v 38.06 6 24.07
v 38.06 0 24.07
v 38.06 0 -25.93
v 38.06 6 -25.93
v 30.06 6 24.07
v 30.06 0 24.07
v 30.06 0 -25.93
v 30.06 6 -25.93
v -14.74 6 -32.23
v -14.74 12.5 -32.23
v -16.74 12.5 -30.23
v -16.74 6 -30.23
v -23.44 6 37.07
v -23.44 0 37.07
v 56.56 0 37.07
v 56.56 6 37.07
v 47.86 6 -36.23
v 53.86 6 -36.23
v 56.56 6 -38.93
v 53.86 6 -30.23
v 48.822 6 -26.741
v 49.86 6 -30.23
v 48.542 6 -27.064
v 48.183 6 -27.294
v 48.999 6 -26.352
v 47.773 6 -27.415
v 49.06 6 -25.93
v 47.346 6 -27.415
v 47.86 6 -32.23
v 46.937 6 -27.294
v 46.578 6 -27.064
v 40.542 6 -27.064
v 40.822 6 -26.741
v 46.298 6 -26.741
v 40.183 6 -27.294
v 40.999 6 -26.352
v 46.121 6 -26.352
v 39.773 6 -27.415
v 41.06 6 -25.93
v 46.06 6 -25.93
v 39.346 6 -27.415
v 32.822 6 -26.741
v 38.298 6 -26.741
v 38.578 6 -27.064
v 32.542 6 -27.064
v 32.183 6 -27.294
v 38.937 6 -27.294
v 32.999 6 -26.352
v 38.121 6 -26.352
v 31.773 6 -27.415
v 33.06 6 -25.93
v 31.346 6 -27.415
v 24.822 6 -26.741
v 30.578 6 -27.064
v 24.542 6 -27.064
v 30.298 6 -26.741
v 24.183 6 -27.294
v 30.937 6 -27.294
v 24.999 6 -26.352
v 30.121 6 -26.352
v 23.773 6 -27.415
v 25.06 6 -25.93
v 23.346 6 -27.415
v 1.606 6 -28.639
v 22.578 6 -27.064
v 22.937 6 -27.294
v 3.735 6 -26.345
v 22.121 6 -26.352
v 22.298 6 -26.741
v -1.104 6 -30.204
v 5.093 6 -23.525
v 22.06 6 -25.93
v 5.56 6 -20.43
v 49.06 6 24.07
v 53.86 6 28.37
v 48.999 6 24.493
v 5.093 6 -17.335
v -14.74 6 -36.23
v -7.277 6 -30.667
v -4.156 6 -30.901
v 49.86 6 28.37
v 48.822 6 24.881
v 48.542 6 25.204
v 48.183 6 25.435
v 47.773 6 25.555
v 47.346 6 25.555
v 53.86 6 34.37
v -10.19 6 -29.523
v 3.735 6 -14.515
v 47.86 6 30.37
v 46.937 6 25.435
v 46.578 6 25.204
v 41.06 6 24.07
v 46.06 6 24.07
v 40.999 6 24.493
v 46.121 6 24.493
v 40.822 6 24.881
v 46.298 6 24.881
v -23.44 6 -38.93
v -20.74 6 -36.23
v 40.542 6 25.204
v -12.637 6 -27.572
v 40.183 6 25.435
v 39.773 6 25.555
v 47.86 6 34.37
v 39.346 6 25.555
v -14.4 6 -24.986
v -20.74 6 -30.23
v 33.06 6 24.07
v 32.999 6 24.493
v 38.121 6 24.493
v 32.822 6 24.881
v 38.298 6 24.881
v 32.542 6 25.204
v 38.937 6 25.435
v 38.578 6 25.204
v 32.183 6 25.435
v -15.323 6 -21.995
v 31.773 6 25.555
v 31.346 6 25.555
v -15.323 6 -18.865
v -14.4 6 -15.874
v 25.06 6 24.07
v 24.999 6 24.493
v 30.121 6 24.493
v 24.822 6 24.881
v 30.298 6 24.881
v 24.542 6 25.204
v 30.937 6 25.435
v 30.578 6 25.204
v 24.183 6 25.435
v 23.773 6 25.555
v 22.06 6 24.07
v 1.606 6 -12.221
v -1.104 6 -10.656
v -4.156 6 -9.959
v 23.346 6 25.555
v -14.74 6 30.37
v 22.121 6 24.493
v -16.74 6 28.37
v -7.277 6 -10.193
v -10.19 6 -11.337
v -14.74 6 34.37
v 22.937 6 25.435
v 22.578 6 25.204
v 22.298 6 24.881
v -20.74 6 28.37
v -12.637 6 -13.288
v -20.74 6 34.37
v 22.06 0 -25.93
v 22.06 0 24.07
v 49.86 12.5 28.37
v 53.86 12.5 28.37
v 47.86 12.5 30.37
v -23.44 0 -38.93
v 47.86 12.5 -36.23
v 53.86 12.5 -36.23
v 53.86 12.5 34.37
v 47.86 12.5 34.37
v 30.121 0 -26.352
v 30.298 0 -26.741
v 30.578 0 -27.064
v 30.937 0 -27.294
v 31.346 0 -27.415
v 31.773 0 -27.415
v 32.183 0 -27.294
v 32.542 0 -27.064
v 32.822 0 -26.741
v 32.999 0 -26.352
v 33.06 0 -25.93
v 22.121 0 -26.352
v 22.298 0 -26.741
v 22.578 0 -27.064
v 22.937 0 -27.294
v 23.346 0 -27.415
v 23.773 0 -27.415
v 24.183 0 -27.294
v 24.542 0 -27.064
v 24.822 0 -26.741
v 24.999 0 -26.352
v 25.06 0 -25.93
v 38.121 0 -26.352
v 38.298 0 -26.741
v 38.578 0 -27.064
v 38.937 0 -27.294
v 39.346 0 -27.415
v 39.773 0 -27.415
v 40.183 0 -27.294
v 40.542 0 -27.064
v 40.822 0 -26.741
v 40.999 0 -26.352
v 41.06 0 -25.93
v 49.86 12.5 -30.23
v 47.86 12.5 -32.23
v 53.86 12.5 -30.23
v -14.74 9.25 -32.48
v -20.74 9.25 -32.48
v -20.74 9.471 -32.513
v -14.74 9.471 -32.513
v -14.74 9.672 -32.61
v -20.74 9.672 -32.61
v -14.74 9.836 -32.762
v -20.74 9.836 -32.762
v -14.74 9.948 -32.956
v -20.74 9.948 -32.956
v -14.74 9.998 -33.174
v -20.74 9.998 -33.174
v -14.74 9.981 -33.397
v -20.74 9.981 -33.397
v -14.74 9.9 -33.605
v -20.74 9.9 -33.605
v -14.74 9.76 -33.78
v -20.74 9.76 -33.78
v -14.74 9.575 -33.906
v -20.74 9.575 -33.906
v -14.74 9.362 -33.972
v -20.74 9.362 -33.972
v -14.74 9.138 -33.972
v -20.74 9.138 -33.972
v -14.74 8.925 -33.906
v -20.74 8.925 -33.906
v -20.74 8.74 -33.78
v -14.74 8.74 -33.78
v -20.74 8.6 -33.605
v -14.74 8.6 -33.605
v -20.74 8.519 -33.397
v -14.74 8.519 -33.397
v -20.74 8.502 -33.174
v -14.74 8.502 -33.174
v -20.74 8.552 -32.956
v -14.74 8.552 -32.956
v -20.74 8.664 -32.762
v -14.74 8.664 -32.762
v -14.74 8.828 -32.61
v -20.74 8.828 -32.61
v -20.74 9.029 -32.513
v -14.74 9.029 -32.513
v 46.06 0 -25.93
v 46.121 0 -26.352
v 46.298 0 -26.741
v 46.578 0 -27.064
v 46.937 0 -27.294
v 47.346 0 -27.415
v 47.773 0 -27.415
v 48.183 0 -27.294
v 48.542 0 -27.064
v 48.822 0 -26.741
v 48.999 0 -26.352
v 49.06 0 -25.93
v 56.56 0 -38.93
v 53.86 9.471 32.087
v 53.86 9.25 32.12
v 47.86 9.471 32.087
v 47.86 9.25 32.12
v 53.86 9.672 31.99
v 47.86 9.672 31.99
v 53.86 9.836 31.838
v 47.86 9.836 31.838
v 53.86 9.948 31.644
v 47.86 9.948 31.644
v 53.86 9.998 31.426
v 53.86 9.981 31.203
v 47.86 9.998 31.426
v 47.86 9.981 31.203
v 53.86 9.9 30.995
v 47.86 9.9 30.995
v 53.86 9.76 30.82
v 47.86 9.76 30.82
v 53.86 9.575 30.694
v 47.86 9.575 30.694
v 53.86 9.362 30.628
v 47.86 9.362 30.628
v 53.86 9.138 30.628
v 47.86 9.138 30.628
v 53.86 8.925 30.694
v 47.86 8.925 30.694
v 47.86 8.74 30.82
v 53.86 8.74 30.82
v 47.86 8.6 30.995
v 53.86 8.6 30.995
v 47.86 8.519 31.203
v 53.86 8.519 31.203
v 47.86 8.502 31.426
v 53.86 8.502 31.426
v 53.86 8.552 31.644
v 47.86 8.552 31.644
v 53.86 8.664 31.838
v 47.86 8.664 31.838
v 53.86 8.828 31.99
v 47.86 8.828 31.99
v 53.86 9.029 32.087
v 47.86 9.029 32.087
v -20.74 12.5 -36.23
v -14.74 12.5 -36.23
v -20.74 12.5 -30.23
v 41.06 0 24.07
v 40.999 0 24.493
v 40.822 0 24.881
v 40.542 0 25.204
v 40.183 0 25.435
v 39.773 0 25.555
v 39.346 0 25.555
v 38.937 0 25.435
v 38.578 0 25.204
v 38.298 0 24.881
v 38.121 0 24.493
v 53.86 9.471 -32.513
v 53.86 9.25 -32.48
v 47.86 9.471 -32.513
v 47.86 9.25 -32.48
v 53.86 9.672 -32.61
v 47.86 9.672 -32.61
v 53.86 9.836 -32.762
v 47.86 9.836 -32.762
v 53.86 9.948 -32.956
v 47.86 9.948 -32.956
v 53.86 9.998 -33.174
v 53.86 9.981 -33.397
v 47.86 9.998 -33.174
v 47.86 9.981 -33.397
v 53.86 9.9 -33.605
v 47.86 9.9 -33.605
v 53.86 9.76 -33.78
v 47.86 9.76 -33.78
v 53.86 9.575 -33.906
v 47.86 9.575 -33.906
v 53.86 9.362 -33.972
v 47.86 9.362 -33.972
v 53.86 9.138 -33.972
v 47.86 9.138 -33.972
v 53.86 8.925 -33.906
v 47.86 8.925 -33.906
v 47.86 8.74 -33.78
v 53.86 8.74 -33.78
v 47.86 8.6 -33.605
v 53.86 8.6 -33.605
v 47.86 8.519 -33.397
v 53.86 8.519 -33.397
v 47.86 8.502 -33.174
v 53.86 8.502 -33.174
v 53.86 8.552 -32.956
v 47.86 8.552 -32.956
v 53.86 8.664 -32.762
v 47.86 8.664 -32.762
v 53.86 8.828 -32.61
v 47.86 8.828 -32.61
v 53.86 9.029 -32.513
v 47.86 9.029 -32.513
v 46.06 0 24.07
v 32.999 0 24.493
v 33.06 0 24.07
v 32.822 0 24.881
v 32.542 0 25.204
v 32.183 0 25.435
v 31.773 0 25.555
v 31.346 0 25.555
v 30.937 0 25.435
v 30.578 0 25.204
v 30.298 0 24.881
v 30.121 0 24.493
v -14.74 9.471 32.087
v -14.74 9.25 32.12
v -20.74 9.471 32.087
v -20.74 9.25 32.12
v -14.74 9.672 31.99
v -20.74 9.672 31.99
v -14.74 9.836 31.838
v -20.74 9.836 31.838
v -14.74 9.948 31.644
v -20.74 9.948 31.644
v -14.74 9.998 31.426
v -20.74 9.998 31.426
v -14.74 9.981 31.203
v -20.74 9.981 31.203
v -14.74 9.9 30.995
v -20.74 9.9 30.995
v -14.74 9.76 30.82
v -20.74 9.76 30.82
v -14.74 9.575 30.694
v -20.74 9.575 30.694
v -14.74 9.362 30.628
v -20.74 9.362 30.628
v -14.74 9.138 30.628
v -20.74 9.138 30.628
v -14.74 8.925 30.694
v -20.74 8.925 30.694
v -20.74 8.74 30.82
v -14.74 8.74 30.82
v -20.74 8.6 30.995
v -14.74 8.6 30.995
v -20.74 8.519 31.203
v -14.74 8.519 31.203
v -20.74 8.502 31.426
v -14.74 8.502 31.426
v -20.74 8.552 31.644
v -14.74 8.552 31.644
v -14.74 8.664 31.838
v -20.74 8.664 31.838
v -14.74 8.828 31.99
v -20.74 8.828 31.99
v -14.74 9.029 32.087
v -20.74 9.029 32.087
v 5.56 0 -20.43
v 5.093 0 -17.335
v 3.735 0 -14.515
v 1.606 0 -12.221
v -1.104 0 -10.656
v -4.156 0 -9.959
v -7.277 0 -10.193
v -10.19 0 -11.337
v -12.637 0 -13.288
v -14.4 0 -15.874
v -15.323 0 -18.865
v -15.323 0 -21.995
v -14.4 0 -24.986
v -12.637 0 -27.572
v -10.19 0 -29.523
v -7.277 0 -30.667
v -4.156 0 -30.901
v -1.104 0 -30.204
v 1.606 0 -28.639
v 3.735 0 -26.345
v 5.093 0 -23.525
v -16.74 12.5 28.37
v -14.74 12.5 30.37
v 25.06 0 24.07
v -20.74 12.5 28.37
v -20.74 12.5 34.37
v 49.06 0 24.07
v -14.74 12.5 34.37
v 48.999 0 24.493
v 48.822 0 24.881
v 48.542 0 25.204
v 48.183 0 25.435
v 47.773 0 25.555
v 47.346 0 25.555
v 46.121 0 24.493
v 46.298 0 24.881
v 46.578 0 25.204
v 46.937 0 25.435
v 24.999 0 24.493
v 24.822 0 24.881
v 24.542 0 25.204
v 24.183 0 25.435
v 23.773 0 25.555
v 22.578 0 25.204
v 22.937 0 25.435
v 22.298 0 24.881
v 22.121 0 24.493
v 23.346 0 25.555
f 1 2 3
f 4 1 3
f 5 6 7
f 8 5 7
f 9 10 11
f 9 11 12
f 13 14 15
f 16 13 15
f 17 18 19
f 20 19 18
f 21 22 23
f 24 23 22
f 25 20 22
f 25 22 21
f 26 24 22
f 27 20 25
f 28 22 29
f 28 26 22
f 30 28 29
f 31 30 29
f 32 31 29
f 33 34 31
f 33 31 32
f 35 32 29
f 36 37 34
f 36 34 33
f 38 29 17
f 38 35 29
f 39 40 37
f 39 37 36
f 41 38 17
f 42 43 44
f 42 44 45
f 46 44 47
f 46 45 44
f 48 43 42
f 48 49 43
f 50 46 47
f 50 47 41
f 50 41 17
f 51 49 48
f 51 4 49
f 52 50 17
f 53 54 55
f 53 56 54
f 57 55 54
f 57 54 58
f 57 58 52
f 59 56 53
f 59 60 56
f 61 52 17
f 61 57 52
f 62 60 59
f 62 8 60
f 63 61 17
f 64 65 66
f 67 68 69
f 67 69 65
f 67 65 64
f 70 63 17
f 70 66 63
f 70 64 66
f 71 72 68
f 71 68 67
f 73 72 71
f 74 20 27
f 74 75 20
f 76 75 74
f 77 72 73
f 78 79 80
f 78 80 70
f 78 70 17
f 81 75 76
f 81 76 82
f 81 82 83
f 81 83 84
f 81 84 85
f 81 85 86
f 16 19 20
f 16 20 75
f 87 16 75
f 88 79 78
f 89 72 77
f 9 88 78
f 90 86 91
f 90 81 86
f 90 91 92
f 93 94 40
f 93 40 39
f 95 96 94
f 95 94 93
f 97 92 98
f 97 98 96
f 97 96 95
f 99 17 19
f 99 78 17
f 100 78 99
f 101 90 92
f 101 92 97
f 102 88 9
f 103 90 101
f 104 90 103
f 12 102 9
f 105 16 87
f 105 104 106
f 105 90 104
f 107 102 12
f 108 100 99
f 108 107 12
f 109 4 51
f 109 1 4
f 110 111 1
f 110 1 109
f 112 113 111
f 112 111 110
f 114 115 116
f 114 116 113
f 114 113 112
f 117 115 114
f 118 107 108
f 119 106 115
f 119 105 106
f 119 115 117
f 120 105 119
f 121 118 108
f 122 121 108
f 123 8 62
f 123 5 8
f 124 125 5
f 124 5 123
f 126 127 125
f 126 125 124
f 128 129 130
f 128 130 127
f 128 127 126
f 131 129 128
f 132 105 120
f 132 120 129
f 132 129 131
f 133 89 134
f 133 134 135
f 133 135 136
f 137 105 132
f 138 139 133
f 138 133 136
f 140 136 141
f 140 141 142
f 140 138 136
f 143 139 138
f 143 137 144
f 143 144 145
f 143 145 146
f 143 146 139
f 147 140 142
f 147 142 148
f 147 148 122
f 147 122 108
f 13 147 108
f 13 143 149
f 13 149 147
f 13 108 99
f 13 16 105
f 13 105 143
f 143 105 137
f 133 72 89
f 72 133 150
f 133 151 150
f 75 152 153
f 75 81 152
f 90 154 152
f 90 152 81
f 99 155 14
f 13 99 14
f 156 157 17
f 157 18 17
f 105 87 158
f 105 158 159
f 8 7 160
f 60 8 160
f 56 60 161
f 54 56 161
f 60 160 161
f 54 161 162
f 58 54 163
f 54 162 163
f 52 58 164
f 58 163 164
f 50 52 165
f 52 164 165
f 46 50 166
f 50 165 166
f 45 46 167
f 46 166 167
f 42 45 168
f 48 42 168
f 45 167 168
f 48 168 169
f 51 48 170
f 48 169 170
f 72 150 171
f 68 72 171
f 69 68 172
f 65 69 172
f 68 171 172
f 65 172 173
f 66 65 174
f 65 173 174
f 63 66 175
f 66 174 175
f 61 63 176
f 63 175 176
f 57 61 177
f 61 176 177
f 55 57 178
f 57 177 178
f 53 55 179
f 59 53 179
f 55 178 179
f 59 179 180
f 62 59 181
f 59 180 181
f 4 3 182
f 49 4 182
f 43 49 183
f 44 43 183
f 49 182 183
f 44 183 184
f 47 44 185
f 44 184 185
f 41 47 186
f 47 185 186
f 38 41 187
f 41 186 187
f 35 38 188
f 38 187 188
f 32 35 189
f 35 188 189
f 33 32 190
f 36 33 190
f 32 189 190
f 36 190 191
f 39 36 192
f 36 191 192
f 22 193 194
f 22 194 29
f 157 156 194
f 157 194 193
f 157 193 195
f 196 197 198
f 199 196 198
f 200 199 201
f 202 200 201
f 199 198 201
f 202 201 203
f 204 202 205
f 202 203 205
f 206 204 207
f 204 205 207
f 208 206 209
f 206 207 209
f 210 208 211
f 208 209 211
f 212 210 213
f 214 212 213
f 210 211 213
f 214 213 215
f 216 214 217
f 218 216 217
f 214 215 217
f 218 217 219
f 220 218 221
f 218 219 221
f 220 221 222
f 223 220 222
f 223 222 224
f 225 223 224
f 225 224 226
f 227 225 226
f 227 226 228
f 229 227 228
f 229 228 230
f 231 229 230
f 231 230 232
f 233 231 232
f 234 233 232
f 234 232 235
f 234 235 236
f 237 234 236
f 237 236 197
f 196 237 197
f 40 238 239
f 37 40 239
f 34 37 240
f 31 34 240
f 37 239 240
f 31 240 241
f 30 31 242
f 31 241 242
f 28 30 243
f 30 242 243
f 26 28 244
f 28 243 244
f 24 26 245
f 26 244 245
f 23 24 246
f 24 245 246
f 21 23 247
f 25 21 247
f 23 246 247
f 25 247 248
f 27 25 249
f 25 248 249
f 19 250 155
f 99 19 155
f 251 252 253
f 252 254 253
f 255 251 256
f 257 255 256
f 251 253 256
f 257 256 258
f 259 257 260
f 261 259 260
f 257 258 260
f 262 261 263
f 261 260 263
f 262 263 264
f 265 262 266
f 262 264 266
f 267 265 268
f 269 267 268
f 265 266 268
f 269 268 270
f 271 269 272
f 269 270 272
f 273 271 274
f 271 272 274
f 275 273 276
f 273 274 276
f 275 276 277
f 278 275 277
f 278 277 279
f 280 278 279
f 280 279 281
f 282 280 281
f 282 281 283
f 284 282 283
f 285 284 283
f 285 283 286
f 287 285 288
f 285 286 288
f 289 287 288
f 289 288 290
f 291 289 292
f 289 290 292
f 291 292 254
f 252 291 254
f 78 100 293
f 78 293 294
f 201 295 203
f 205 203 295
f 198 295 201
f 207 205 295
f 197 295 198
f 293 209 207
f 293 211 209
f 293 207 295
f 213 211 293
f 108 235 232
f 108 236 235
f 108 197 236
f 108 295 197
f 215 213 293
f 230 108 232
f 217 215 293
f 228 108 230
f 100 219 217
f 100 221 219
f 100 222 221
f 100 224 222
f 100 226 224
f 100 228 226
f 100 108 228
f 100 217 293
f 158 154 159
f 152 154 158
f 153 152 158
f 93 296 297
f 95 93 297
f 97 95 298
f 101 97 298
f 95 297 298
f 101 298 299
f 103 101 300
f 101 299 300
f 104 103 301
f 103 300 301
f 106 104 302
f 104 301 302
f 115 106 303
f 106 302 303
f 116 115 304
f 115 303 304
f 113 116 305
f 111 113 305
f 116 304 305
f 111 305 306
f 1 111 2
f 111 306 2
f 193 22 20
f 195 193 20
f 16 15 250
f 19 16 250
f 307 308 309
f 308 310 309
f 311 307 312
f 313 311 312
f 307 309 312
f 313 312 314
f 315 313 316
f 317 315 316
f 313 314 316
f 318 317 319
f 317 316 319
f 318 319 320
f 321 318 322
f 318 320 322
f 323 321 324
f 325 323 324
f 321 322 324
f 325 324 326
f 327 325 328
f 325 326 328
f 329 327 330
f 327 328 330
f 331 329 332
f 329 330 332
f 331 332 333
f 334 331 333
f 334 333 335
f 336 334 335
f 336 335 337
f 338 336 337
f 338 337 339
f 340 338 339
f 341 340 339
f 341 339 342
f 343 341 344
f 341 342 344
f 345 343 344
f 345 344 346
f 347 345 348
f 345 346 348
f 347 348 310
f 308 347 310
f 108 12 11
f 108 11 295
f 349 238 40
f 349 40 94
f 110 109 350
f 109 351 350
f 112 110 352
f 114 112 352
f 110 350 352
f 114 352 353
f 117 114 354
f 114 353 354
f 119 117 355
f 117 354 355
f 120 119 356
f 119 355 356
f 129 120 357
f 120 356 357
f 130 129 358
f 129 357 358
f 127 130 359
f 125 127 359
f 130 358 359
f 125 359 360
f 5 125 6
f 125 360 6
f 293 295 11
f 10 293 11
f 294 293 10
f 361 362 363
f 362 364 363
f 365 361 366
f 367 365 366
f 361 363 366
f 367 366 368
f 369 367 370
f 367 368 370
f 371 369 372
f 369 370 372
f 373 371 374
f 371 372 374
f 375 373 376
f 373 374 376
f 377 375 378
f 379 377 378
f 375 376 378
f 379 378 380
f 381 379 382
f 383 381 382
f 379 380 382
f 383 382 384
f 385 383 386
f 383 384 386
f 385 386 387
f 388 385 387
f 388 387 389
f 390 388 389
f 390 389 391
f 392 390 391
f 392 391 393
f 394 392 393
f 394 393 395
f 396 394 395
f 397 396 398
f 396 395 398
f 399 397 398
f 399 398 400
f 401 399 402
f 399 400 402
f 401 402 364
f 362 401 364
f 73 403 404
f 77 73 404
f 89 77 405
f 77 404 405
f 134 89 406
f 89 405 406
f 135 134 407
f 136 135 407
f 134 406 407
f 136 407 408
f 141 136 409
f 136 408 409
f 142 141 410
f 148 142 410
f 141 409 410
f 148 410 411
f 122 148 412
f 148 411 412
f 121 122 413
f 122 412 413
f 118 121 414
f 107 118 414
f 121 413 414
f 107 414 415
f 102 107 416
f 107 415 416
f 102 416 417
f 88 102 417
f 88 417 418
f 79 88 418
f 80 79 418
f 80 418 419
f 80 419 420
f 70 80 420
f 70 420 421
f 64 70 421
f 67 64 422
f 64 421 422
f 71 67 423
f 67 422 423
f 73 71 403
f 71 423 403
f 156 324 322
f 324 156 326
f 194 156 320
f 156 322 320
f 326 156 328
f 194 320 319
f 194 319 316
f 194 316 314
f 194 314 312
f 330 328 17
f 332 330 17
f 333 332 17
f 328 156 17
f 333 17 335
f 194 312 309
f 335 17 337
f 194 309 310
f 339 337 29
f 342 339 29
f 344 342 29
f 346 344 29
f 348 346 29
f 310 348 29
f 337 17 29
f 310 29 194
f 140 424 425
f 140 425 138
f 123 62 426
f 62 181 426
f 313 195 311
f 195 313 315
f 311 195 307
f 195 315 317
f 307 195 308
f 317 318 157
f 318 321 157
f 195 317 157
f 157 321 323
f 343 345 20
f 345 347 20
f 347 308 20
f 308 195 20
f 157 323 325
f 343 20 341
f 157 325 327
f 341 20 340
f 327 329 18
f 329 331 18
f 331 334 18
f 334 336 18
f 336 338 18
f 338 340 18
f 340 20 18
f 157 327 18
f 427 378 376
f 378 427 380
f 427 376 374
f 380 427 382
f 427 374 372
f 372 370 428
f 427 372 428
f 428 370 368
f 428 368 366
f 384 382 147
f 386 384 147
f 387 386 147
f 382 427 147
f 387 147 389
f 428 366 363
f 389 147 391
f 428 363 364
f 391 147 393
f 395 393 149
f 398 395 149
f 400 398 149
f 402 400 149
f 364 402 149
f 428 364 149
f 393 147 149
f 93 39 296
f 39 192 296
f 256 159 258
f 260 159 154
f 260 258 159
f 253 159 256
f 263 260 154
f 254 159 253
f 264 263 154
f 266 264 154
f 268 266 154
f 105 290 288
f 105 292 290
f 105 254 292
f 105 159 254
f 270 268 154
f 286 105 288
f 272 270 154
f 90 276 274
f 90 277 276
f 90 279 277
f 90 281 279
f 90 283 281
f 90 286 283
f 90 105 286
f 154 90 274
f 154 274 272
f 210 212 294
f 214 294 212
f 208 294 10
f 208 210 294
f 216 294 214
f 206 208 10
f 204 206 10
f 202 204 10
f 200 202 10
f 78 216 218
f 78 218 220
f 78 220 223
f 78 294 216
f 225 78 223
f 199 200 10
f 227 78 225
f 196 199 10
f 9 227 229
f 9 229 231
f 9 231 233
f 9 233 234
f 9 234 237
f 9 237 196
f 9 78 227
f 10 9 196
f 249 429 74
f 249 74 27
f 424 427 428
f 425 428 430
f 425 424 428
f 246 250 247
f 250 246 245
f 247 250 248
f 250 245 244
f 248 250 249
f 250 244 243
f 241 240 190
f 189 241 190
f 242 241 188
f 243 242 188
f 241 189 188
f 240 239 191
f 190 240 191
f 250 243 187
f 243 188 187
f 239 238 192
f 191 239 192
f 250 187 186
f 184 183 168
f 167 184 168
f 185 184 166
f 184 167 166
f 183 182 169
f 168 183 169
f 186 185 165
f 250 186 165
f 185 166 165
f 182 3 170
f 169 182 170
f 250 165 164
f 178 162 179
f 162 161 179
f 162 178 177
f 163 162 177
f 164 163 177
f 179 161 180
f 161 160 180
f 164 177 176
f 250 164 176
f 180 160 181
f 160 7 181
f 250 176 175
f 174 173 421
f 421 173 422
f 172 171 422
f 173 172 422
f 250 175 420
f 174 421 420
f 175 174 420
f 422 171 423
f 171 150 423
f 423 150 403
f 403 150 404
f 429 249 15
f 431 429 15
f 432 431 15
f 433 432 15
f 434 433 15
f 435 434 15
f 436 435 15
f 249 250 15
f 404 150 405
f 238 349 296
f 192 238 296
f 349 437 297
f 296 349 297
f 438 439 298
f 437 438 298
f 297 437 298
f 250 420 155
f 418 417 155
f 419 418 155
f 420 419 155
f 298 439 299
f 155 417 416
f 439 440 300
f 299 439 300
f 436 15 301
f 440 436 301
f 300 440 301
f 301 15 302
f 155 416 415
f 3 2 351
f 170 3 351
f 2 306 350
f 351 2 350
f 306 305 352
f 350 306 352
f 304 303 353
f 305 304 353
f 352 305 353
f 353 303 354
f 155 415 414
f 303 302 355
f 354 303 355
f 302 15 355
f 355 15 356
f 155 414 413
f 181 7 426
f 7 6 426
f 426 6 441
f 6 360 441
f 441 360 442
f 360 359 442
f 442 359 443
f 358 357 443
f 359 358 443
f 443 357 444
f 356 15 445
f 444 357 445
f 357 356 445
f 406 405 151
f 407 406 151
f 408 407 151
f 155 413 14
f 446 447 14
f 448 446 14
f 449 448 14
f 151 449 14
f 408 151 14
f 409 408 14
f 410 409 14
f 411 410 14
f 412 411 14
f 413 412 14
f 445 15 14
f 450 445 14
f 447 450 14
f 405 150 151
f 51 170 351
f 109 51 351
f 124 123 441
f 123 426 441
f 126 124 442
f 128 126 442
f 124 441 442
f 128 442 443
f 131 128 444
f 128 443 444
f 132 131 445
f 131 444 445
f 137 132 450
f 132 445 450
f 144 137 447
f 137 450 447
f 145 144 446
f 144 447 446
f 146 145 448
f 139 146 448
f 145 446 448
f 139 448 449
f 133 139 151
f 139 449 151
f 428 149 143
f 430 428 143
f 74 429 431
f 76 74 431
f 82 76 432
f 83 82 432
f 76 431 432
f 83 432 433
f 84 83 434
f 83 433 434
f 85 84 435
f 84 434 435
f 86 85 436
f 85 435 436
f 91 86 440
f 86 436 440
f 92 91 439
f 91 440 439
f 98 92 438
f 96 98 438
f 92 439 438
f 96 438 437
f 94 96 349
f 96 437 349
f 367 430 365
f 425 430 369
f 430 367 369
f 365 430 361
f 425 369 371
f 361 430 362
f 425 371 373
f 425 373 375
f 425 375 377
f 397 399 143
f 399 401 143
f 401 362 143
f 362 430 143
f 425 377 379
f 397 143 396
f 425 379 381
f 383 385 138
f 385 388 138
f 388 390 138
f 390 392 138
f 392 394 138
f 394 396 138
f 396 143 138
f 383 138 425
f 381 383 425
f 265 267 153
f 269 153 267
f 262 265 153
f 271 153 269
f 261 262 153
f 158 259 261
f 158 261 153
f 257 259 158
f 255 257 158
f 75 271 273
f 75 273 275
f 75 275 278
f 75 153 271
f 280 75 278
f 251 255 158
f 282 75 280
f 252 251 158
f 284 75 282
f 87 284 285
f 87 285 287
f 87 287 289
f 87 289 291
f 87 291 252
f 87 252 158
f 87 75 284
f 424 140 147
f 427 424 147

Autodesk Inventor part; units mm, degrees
ref_plane "YZ Plane" through (0, 0, 0) normal (1, 0, 0) x (0, 1, 0)
ref_plane "XZ Plane" through (0, 0, 0) normal (0, 1, 0) x (-1, 0, 0)
ref_plane "XY Plane" through (0, 0, 0) normal (0, 0, 1) x (1, 0, 0)
sketch "Skizze1" plane through (0, 0, 0) normal (0, 1, 0) x (-1, 0, 0)
  line L0 (23.4402, 37.0701) -> (-56.5598, 37.0701)
  line L1 (-56.5598, 37.0701) -> (-56.5598, -38.9299)
  line L2 (-56.5598, -38.9299) -> (23.4402, -38.9299)
  line L3 (23.4402, -38.9299) -> (23.4402, 37.0701)
  point P0 (0, 0)
  dimension "d0" = 76
  dimension "d1" = 80
extrude "Extrusion1" add sketch "Skizze1" along normal blind 6
sketch "Skizze8" plane through (0, 0, 0) normal (0, -1, 0) x (1, 0, 0)
  line L0 (47.5598, 24.0701) -> (47.5598, -25.9299) construction
  line L1 (49.0598, 24.0701) -> (49.0598, -25.9299)
  line L2 (46.0598, -25.9299) -> (46.0598, 24.0701)
  arc A0 (49.0598, 24.0701) -> (46.0598, 24.0701) centre (47.5598, 24.0701) ccw
  arc A1 (46.0598, -25.9299) -> (49.0598, -25.9299) centre (47.5598, -25.9299) ccw
  line L3 (52.5598, -0.9299) -> (-23.4402, -0.9299)
  line L4 (39.5598, 24.0701) -> (39.5598, -25.9299) construction
  line L5 (38.0598, 24.0701) -> (38.0598, -25.9299)
  line L6 (41.0598, -25.9299) -> (41.0598, 24.0701)
  arc A2 (41.0598, 24.0701) -> (38.0598, 24.0701) centre (39.5598, 24.0701) ccw
  arc A3 (38.0598, -25.9299) -> (41.0598, -25.9299) centre (39.5598, -25.9299) ccw
  line L7 (56.5598, 37.0701) -> (56.5598, -38.9299) projected
  line L8 (56.5598, -38.9299) -> (-23.4402, -38.9299) projected
  line L9 (41.0598, 24.0701) -> (38.0598, 24.0701) construction
  line L10 (41.0598, -25.9299) -> (38.0598, -25.9299) construction
  line L11 (49.0598, -25.9299) -> (46.0598, -25.9299) construction
  arc A4 (30.0598, -25.9299) -> (33.0598, -25.9299) centre (31.5598, -25.9299) ccw
  line L12 (31.5598, 24.0701) -> (31.5598, -25.9299) construction
  line L13 (30.0598, 24.0701) -> (30.0598, -25.9299)
  line L14 (33.0598, -25.9299) -> (33.0598, 24.0701)
  arc A5 (33.0598, 24.0701) -> (30.0598, 24.0701) centre (31.5598, 24.0701) ccw
  line L15 (33.0598, 24.0701) -> (30.0598, 24.0701) construction
  line L16 (33.0598, -25.9299) -> (30.0598, -25.9299) construction
  line L17 (25.0598, 24.0701) -> (22.0598, 24.0701) construction
  arc A6 (25.0598, 24.0701) -> (22.0598, 24.0701) centre (23.5598, 24.0701) ccw
  line L18 (25.0598, -25.9299) -> (25.0598, 24.0701)
  line L19 (23.5598, 24.0701) -> (23.5598, -25.9299) construction
  line L20 (22.0598, 24.0701) -> (22.0598, -25.9299)
  line L21 (25.0598, -25.9299) -> (22.0598, -25.9299) construction
  arc A7 (22.0598, -25.9299) -> (25.0598, -25.9299) centre (23.5598, -25.9299) ccw
  line L22 (-23.4402, 37.0701) -> (56.5598, 37.0701) projected
  line L23 (-23.4402, -38.9299) -> (-23.4402, 37.0701) projected
  circle A8 centre (-4.9402, -20.4299) radius 10.5
  point P0 (47.5598, -0.9299)
  point P1 (35.0598, -0.9299)
  dimension "d69" = 7.5
  dimension "d70" = 50
  dimension "d71" = 38
  dimension "d72" = 5
  dimension "d74" = 3
  dimension "d75" = 5
  dimension "d76" = 5
  dimension "d109" = 21
  dimension "d110" = 18.5
  dimension "d111" = 18.5
extrude "Extrusion8" cut sketch "Skizze8" against normal blind 10 contours L18 A7 L20 L3 | L3 L20 A6 L18 | L14 A4 L13 L3 | L3 L13 A5 L14 | L6 A3 L5 L3 | L3 L5 A2 L6 | L1 L3 L2 A0 | L1 A1 L2 L3 | A8
sketch "Skizze14" plane through (0, 6, 0) normal (0, 1, 0) x (1, 0, 0)
  line L0 (-20.7402, -34.3701) -> (-14.7402, -34.3701)
  line L1 (-14.7402, -34.3701) -> (-14.7402, -28.3701)
  line L2 (-14.7402, -28.3701) -> (-20.7402, -28.3701)
  line L3 (-20.7402, -28.3701) -> (-20.7402, -34.3701)
  line L4 (-20.7402, 36.2299) -> (-14.7402, 36.2299)
  line L5 (-14.7402, 36.2299) -> (-14.7402, 30.2299)
  line L6 (-14.7402, 30.2299) -> (-20.7402, 30.2299)
  line L7 (-20.7402, 30.2299) -> (-20.7402, 36.2299)
  line L8 (-23.4402, 38.9299) -> (-23.4402, -37.0701) projected
  line L9 (56.5598, 38.9299) -> (-23.4402, 38.9299) projected
  line L10 (-23.4402, -37.0701) -> (56.5598, -37.0701) projected
  line L11 (47.8598, 30.2299) -> (53.8598, 30.2299)
  line L12 (53.8598, 30.2299) -> (53.8598, 36.2299)
  line L13 (53.8598, 36.2299) -> (47.8598, 36.2299)
  line L14 (47.8598, 36.2299) -> (47.8598, 30.2299)
  line L15 (53.8598, -34.3701) -> (47.8598, -34.3701)
  line L16 (47.8598, -34.3701) -> (47.8598, -28.3701)
  line L17 (47.8598, -28.3701) -> (53.8598, -28.3701)
  line L18 (53.8598, -28.3701) -> (53.8598, -34.3701)
  line L19 (56.5598, -37.0701) -> (56.5598, 38.9299) projected
  point P0 (0, 0)
  dimension "d83" = 6
  dimension "d84" = 2.7
  dimension "d85" = 2.7
  dimension "d86" = 2.7
  dimension "d112" = 2.7
extrude "Extrusion14" add sketch "Skizze14" along normal blind 6.5 contours L3 L2 L1 L0 | L4 L5 L6 L7 | L14 L13 L12 L11 | L15 L16 L17 L18
sketch "Skizze17" plane through (-20.7402, 6, -36.2299) normal (-1, 0, 0) x (0, 0, 1)
  circle A0 centre (67.6, 3.25) radius 0.75
  circle A1 centre (3, 3.25) radius 0.75
  line L0 (-2.7, 0) -> (73.3, 0) projected
  line L1 (0, 0) -> (0, 6.5) projected
  line L2 (70.6, 0) -> (70.6, 6.5) projected
  point P0 (36.2299, -6)
  dimension "d102" = 3.25
  dimension "d103" = 1.5
  dimension "d104" = 3
  dimension "d105" = 3
  dimension "d106" = 3.25
extrude "Extrusion17" cut sketch "Skizze17" against normal through all
chamfer "Fase1" distance 2 angle 45 4 edges at (-14.7402, 9.25, 28.3701) (-14.7402, 9.25, -30.2299) (47.8598, 9.25, 28.3701) (47.8598, 9.25, -30.2299)
properties part number "cover without shutdown button"
